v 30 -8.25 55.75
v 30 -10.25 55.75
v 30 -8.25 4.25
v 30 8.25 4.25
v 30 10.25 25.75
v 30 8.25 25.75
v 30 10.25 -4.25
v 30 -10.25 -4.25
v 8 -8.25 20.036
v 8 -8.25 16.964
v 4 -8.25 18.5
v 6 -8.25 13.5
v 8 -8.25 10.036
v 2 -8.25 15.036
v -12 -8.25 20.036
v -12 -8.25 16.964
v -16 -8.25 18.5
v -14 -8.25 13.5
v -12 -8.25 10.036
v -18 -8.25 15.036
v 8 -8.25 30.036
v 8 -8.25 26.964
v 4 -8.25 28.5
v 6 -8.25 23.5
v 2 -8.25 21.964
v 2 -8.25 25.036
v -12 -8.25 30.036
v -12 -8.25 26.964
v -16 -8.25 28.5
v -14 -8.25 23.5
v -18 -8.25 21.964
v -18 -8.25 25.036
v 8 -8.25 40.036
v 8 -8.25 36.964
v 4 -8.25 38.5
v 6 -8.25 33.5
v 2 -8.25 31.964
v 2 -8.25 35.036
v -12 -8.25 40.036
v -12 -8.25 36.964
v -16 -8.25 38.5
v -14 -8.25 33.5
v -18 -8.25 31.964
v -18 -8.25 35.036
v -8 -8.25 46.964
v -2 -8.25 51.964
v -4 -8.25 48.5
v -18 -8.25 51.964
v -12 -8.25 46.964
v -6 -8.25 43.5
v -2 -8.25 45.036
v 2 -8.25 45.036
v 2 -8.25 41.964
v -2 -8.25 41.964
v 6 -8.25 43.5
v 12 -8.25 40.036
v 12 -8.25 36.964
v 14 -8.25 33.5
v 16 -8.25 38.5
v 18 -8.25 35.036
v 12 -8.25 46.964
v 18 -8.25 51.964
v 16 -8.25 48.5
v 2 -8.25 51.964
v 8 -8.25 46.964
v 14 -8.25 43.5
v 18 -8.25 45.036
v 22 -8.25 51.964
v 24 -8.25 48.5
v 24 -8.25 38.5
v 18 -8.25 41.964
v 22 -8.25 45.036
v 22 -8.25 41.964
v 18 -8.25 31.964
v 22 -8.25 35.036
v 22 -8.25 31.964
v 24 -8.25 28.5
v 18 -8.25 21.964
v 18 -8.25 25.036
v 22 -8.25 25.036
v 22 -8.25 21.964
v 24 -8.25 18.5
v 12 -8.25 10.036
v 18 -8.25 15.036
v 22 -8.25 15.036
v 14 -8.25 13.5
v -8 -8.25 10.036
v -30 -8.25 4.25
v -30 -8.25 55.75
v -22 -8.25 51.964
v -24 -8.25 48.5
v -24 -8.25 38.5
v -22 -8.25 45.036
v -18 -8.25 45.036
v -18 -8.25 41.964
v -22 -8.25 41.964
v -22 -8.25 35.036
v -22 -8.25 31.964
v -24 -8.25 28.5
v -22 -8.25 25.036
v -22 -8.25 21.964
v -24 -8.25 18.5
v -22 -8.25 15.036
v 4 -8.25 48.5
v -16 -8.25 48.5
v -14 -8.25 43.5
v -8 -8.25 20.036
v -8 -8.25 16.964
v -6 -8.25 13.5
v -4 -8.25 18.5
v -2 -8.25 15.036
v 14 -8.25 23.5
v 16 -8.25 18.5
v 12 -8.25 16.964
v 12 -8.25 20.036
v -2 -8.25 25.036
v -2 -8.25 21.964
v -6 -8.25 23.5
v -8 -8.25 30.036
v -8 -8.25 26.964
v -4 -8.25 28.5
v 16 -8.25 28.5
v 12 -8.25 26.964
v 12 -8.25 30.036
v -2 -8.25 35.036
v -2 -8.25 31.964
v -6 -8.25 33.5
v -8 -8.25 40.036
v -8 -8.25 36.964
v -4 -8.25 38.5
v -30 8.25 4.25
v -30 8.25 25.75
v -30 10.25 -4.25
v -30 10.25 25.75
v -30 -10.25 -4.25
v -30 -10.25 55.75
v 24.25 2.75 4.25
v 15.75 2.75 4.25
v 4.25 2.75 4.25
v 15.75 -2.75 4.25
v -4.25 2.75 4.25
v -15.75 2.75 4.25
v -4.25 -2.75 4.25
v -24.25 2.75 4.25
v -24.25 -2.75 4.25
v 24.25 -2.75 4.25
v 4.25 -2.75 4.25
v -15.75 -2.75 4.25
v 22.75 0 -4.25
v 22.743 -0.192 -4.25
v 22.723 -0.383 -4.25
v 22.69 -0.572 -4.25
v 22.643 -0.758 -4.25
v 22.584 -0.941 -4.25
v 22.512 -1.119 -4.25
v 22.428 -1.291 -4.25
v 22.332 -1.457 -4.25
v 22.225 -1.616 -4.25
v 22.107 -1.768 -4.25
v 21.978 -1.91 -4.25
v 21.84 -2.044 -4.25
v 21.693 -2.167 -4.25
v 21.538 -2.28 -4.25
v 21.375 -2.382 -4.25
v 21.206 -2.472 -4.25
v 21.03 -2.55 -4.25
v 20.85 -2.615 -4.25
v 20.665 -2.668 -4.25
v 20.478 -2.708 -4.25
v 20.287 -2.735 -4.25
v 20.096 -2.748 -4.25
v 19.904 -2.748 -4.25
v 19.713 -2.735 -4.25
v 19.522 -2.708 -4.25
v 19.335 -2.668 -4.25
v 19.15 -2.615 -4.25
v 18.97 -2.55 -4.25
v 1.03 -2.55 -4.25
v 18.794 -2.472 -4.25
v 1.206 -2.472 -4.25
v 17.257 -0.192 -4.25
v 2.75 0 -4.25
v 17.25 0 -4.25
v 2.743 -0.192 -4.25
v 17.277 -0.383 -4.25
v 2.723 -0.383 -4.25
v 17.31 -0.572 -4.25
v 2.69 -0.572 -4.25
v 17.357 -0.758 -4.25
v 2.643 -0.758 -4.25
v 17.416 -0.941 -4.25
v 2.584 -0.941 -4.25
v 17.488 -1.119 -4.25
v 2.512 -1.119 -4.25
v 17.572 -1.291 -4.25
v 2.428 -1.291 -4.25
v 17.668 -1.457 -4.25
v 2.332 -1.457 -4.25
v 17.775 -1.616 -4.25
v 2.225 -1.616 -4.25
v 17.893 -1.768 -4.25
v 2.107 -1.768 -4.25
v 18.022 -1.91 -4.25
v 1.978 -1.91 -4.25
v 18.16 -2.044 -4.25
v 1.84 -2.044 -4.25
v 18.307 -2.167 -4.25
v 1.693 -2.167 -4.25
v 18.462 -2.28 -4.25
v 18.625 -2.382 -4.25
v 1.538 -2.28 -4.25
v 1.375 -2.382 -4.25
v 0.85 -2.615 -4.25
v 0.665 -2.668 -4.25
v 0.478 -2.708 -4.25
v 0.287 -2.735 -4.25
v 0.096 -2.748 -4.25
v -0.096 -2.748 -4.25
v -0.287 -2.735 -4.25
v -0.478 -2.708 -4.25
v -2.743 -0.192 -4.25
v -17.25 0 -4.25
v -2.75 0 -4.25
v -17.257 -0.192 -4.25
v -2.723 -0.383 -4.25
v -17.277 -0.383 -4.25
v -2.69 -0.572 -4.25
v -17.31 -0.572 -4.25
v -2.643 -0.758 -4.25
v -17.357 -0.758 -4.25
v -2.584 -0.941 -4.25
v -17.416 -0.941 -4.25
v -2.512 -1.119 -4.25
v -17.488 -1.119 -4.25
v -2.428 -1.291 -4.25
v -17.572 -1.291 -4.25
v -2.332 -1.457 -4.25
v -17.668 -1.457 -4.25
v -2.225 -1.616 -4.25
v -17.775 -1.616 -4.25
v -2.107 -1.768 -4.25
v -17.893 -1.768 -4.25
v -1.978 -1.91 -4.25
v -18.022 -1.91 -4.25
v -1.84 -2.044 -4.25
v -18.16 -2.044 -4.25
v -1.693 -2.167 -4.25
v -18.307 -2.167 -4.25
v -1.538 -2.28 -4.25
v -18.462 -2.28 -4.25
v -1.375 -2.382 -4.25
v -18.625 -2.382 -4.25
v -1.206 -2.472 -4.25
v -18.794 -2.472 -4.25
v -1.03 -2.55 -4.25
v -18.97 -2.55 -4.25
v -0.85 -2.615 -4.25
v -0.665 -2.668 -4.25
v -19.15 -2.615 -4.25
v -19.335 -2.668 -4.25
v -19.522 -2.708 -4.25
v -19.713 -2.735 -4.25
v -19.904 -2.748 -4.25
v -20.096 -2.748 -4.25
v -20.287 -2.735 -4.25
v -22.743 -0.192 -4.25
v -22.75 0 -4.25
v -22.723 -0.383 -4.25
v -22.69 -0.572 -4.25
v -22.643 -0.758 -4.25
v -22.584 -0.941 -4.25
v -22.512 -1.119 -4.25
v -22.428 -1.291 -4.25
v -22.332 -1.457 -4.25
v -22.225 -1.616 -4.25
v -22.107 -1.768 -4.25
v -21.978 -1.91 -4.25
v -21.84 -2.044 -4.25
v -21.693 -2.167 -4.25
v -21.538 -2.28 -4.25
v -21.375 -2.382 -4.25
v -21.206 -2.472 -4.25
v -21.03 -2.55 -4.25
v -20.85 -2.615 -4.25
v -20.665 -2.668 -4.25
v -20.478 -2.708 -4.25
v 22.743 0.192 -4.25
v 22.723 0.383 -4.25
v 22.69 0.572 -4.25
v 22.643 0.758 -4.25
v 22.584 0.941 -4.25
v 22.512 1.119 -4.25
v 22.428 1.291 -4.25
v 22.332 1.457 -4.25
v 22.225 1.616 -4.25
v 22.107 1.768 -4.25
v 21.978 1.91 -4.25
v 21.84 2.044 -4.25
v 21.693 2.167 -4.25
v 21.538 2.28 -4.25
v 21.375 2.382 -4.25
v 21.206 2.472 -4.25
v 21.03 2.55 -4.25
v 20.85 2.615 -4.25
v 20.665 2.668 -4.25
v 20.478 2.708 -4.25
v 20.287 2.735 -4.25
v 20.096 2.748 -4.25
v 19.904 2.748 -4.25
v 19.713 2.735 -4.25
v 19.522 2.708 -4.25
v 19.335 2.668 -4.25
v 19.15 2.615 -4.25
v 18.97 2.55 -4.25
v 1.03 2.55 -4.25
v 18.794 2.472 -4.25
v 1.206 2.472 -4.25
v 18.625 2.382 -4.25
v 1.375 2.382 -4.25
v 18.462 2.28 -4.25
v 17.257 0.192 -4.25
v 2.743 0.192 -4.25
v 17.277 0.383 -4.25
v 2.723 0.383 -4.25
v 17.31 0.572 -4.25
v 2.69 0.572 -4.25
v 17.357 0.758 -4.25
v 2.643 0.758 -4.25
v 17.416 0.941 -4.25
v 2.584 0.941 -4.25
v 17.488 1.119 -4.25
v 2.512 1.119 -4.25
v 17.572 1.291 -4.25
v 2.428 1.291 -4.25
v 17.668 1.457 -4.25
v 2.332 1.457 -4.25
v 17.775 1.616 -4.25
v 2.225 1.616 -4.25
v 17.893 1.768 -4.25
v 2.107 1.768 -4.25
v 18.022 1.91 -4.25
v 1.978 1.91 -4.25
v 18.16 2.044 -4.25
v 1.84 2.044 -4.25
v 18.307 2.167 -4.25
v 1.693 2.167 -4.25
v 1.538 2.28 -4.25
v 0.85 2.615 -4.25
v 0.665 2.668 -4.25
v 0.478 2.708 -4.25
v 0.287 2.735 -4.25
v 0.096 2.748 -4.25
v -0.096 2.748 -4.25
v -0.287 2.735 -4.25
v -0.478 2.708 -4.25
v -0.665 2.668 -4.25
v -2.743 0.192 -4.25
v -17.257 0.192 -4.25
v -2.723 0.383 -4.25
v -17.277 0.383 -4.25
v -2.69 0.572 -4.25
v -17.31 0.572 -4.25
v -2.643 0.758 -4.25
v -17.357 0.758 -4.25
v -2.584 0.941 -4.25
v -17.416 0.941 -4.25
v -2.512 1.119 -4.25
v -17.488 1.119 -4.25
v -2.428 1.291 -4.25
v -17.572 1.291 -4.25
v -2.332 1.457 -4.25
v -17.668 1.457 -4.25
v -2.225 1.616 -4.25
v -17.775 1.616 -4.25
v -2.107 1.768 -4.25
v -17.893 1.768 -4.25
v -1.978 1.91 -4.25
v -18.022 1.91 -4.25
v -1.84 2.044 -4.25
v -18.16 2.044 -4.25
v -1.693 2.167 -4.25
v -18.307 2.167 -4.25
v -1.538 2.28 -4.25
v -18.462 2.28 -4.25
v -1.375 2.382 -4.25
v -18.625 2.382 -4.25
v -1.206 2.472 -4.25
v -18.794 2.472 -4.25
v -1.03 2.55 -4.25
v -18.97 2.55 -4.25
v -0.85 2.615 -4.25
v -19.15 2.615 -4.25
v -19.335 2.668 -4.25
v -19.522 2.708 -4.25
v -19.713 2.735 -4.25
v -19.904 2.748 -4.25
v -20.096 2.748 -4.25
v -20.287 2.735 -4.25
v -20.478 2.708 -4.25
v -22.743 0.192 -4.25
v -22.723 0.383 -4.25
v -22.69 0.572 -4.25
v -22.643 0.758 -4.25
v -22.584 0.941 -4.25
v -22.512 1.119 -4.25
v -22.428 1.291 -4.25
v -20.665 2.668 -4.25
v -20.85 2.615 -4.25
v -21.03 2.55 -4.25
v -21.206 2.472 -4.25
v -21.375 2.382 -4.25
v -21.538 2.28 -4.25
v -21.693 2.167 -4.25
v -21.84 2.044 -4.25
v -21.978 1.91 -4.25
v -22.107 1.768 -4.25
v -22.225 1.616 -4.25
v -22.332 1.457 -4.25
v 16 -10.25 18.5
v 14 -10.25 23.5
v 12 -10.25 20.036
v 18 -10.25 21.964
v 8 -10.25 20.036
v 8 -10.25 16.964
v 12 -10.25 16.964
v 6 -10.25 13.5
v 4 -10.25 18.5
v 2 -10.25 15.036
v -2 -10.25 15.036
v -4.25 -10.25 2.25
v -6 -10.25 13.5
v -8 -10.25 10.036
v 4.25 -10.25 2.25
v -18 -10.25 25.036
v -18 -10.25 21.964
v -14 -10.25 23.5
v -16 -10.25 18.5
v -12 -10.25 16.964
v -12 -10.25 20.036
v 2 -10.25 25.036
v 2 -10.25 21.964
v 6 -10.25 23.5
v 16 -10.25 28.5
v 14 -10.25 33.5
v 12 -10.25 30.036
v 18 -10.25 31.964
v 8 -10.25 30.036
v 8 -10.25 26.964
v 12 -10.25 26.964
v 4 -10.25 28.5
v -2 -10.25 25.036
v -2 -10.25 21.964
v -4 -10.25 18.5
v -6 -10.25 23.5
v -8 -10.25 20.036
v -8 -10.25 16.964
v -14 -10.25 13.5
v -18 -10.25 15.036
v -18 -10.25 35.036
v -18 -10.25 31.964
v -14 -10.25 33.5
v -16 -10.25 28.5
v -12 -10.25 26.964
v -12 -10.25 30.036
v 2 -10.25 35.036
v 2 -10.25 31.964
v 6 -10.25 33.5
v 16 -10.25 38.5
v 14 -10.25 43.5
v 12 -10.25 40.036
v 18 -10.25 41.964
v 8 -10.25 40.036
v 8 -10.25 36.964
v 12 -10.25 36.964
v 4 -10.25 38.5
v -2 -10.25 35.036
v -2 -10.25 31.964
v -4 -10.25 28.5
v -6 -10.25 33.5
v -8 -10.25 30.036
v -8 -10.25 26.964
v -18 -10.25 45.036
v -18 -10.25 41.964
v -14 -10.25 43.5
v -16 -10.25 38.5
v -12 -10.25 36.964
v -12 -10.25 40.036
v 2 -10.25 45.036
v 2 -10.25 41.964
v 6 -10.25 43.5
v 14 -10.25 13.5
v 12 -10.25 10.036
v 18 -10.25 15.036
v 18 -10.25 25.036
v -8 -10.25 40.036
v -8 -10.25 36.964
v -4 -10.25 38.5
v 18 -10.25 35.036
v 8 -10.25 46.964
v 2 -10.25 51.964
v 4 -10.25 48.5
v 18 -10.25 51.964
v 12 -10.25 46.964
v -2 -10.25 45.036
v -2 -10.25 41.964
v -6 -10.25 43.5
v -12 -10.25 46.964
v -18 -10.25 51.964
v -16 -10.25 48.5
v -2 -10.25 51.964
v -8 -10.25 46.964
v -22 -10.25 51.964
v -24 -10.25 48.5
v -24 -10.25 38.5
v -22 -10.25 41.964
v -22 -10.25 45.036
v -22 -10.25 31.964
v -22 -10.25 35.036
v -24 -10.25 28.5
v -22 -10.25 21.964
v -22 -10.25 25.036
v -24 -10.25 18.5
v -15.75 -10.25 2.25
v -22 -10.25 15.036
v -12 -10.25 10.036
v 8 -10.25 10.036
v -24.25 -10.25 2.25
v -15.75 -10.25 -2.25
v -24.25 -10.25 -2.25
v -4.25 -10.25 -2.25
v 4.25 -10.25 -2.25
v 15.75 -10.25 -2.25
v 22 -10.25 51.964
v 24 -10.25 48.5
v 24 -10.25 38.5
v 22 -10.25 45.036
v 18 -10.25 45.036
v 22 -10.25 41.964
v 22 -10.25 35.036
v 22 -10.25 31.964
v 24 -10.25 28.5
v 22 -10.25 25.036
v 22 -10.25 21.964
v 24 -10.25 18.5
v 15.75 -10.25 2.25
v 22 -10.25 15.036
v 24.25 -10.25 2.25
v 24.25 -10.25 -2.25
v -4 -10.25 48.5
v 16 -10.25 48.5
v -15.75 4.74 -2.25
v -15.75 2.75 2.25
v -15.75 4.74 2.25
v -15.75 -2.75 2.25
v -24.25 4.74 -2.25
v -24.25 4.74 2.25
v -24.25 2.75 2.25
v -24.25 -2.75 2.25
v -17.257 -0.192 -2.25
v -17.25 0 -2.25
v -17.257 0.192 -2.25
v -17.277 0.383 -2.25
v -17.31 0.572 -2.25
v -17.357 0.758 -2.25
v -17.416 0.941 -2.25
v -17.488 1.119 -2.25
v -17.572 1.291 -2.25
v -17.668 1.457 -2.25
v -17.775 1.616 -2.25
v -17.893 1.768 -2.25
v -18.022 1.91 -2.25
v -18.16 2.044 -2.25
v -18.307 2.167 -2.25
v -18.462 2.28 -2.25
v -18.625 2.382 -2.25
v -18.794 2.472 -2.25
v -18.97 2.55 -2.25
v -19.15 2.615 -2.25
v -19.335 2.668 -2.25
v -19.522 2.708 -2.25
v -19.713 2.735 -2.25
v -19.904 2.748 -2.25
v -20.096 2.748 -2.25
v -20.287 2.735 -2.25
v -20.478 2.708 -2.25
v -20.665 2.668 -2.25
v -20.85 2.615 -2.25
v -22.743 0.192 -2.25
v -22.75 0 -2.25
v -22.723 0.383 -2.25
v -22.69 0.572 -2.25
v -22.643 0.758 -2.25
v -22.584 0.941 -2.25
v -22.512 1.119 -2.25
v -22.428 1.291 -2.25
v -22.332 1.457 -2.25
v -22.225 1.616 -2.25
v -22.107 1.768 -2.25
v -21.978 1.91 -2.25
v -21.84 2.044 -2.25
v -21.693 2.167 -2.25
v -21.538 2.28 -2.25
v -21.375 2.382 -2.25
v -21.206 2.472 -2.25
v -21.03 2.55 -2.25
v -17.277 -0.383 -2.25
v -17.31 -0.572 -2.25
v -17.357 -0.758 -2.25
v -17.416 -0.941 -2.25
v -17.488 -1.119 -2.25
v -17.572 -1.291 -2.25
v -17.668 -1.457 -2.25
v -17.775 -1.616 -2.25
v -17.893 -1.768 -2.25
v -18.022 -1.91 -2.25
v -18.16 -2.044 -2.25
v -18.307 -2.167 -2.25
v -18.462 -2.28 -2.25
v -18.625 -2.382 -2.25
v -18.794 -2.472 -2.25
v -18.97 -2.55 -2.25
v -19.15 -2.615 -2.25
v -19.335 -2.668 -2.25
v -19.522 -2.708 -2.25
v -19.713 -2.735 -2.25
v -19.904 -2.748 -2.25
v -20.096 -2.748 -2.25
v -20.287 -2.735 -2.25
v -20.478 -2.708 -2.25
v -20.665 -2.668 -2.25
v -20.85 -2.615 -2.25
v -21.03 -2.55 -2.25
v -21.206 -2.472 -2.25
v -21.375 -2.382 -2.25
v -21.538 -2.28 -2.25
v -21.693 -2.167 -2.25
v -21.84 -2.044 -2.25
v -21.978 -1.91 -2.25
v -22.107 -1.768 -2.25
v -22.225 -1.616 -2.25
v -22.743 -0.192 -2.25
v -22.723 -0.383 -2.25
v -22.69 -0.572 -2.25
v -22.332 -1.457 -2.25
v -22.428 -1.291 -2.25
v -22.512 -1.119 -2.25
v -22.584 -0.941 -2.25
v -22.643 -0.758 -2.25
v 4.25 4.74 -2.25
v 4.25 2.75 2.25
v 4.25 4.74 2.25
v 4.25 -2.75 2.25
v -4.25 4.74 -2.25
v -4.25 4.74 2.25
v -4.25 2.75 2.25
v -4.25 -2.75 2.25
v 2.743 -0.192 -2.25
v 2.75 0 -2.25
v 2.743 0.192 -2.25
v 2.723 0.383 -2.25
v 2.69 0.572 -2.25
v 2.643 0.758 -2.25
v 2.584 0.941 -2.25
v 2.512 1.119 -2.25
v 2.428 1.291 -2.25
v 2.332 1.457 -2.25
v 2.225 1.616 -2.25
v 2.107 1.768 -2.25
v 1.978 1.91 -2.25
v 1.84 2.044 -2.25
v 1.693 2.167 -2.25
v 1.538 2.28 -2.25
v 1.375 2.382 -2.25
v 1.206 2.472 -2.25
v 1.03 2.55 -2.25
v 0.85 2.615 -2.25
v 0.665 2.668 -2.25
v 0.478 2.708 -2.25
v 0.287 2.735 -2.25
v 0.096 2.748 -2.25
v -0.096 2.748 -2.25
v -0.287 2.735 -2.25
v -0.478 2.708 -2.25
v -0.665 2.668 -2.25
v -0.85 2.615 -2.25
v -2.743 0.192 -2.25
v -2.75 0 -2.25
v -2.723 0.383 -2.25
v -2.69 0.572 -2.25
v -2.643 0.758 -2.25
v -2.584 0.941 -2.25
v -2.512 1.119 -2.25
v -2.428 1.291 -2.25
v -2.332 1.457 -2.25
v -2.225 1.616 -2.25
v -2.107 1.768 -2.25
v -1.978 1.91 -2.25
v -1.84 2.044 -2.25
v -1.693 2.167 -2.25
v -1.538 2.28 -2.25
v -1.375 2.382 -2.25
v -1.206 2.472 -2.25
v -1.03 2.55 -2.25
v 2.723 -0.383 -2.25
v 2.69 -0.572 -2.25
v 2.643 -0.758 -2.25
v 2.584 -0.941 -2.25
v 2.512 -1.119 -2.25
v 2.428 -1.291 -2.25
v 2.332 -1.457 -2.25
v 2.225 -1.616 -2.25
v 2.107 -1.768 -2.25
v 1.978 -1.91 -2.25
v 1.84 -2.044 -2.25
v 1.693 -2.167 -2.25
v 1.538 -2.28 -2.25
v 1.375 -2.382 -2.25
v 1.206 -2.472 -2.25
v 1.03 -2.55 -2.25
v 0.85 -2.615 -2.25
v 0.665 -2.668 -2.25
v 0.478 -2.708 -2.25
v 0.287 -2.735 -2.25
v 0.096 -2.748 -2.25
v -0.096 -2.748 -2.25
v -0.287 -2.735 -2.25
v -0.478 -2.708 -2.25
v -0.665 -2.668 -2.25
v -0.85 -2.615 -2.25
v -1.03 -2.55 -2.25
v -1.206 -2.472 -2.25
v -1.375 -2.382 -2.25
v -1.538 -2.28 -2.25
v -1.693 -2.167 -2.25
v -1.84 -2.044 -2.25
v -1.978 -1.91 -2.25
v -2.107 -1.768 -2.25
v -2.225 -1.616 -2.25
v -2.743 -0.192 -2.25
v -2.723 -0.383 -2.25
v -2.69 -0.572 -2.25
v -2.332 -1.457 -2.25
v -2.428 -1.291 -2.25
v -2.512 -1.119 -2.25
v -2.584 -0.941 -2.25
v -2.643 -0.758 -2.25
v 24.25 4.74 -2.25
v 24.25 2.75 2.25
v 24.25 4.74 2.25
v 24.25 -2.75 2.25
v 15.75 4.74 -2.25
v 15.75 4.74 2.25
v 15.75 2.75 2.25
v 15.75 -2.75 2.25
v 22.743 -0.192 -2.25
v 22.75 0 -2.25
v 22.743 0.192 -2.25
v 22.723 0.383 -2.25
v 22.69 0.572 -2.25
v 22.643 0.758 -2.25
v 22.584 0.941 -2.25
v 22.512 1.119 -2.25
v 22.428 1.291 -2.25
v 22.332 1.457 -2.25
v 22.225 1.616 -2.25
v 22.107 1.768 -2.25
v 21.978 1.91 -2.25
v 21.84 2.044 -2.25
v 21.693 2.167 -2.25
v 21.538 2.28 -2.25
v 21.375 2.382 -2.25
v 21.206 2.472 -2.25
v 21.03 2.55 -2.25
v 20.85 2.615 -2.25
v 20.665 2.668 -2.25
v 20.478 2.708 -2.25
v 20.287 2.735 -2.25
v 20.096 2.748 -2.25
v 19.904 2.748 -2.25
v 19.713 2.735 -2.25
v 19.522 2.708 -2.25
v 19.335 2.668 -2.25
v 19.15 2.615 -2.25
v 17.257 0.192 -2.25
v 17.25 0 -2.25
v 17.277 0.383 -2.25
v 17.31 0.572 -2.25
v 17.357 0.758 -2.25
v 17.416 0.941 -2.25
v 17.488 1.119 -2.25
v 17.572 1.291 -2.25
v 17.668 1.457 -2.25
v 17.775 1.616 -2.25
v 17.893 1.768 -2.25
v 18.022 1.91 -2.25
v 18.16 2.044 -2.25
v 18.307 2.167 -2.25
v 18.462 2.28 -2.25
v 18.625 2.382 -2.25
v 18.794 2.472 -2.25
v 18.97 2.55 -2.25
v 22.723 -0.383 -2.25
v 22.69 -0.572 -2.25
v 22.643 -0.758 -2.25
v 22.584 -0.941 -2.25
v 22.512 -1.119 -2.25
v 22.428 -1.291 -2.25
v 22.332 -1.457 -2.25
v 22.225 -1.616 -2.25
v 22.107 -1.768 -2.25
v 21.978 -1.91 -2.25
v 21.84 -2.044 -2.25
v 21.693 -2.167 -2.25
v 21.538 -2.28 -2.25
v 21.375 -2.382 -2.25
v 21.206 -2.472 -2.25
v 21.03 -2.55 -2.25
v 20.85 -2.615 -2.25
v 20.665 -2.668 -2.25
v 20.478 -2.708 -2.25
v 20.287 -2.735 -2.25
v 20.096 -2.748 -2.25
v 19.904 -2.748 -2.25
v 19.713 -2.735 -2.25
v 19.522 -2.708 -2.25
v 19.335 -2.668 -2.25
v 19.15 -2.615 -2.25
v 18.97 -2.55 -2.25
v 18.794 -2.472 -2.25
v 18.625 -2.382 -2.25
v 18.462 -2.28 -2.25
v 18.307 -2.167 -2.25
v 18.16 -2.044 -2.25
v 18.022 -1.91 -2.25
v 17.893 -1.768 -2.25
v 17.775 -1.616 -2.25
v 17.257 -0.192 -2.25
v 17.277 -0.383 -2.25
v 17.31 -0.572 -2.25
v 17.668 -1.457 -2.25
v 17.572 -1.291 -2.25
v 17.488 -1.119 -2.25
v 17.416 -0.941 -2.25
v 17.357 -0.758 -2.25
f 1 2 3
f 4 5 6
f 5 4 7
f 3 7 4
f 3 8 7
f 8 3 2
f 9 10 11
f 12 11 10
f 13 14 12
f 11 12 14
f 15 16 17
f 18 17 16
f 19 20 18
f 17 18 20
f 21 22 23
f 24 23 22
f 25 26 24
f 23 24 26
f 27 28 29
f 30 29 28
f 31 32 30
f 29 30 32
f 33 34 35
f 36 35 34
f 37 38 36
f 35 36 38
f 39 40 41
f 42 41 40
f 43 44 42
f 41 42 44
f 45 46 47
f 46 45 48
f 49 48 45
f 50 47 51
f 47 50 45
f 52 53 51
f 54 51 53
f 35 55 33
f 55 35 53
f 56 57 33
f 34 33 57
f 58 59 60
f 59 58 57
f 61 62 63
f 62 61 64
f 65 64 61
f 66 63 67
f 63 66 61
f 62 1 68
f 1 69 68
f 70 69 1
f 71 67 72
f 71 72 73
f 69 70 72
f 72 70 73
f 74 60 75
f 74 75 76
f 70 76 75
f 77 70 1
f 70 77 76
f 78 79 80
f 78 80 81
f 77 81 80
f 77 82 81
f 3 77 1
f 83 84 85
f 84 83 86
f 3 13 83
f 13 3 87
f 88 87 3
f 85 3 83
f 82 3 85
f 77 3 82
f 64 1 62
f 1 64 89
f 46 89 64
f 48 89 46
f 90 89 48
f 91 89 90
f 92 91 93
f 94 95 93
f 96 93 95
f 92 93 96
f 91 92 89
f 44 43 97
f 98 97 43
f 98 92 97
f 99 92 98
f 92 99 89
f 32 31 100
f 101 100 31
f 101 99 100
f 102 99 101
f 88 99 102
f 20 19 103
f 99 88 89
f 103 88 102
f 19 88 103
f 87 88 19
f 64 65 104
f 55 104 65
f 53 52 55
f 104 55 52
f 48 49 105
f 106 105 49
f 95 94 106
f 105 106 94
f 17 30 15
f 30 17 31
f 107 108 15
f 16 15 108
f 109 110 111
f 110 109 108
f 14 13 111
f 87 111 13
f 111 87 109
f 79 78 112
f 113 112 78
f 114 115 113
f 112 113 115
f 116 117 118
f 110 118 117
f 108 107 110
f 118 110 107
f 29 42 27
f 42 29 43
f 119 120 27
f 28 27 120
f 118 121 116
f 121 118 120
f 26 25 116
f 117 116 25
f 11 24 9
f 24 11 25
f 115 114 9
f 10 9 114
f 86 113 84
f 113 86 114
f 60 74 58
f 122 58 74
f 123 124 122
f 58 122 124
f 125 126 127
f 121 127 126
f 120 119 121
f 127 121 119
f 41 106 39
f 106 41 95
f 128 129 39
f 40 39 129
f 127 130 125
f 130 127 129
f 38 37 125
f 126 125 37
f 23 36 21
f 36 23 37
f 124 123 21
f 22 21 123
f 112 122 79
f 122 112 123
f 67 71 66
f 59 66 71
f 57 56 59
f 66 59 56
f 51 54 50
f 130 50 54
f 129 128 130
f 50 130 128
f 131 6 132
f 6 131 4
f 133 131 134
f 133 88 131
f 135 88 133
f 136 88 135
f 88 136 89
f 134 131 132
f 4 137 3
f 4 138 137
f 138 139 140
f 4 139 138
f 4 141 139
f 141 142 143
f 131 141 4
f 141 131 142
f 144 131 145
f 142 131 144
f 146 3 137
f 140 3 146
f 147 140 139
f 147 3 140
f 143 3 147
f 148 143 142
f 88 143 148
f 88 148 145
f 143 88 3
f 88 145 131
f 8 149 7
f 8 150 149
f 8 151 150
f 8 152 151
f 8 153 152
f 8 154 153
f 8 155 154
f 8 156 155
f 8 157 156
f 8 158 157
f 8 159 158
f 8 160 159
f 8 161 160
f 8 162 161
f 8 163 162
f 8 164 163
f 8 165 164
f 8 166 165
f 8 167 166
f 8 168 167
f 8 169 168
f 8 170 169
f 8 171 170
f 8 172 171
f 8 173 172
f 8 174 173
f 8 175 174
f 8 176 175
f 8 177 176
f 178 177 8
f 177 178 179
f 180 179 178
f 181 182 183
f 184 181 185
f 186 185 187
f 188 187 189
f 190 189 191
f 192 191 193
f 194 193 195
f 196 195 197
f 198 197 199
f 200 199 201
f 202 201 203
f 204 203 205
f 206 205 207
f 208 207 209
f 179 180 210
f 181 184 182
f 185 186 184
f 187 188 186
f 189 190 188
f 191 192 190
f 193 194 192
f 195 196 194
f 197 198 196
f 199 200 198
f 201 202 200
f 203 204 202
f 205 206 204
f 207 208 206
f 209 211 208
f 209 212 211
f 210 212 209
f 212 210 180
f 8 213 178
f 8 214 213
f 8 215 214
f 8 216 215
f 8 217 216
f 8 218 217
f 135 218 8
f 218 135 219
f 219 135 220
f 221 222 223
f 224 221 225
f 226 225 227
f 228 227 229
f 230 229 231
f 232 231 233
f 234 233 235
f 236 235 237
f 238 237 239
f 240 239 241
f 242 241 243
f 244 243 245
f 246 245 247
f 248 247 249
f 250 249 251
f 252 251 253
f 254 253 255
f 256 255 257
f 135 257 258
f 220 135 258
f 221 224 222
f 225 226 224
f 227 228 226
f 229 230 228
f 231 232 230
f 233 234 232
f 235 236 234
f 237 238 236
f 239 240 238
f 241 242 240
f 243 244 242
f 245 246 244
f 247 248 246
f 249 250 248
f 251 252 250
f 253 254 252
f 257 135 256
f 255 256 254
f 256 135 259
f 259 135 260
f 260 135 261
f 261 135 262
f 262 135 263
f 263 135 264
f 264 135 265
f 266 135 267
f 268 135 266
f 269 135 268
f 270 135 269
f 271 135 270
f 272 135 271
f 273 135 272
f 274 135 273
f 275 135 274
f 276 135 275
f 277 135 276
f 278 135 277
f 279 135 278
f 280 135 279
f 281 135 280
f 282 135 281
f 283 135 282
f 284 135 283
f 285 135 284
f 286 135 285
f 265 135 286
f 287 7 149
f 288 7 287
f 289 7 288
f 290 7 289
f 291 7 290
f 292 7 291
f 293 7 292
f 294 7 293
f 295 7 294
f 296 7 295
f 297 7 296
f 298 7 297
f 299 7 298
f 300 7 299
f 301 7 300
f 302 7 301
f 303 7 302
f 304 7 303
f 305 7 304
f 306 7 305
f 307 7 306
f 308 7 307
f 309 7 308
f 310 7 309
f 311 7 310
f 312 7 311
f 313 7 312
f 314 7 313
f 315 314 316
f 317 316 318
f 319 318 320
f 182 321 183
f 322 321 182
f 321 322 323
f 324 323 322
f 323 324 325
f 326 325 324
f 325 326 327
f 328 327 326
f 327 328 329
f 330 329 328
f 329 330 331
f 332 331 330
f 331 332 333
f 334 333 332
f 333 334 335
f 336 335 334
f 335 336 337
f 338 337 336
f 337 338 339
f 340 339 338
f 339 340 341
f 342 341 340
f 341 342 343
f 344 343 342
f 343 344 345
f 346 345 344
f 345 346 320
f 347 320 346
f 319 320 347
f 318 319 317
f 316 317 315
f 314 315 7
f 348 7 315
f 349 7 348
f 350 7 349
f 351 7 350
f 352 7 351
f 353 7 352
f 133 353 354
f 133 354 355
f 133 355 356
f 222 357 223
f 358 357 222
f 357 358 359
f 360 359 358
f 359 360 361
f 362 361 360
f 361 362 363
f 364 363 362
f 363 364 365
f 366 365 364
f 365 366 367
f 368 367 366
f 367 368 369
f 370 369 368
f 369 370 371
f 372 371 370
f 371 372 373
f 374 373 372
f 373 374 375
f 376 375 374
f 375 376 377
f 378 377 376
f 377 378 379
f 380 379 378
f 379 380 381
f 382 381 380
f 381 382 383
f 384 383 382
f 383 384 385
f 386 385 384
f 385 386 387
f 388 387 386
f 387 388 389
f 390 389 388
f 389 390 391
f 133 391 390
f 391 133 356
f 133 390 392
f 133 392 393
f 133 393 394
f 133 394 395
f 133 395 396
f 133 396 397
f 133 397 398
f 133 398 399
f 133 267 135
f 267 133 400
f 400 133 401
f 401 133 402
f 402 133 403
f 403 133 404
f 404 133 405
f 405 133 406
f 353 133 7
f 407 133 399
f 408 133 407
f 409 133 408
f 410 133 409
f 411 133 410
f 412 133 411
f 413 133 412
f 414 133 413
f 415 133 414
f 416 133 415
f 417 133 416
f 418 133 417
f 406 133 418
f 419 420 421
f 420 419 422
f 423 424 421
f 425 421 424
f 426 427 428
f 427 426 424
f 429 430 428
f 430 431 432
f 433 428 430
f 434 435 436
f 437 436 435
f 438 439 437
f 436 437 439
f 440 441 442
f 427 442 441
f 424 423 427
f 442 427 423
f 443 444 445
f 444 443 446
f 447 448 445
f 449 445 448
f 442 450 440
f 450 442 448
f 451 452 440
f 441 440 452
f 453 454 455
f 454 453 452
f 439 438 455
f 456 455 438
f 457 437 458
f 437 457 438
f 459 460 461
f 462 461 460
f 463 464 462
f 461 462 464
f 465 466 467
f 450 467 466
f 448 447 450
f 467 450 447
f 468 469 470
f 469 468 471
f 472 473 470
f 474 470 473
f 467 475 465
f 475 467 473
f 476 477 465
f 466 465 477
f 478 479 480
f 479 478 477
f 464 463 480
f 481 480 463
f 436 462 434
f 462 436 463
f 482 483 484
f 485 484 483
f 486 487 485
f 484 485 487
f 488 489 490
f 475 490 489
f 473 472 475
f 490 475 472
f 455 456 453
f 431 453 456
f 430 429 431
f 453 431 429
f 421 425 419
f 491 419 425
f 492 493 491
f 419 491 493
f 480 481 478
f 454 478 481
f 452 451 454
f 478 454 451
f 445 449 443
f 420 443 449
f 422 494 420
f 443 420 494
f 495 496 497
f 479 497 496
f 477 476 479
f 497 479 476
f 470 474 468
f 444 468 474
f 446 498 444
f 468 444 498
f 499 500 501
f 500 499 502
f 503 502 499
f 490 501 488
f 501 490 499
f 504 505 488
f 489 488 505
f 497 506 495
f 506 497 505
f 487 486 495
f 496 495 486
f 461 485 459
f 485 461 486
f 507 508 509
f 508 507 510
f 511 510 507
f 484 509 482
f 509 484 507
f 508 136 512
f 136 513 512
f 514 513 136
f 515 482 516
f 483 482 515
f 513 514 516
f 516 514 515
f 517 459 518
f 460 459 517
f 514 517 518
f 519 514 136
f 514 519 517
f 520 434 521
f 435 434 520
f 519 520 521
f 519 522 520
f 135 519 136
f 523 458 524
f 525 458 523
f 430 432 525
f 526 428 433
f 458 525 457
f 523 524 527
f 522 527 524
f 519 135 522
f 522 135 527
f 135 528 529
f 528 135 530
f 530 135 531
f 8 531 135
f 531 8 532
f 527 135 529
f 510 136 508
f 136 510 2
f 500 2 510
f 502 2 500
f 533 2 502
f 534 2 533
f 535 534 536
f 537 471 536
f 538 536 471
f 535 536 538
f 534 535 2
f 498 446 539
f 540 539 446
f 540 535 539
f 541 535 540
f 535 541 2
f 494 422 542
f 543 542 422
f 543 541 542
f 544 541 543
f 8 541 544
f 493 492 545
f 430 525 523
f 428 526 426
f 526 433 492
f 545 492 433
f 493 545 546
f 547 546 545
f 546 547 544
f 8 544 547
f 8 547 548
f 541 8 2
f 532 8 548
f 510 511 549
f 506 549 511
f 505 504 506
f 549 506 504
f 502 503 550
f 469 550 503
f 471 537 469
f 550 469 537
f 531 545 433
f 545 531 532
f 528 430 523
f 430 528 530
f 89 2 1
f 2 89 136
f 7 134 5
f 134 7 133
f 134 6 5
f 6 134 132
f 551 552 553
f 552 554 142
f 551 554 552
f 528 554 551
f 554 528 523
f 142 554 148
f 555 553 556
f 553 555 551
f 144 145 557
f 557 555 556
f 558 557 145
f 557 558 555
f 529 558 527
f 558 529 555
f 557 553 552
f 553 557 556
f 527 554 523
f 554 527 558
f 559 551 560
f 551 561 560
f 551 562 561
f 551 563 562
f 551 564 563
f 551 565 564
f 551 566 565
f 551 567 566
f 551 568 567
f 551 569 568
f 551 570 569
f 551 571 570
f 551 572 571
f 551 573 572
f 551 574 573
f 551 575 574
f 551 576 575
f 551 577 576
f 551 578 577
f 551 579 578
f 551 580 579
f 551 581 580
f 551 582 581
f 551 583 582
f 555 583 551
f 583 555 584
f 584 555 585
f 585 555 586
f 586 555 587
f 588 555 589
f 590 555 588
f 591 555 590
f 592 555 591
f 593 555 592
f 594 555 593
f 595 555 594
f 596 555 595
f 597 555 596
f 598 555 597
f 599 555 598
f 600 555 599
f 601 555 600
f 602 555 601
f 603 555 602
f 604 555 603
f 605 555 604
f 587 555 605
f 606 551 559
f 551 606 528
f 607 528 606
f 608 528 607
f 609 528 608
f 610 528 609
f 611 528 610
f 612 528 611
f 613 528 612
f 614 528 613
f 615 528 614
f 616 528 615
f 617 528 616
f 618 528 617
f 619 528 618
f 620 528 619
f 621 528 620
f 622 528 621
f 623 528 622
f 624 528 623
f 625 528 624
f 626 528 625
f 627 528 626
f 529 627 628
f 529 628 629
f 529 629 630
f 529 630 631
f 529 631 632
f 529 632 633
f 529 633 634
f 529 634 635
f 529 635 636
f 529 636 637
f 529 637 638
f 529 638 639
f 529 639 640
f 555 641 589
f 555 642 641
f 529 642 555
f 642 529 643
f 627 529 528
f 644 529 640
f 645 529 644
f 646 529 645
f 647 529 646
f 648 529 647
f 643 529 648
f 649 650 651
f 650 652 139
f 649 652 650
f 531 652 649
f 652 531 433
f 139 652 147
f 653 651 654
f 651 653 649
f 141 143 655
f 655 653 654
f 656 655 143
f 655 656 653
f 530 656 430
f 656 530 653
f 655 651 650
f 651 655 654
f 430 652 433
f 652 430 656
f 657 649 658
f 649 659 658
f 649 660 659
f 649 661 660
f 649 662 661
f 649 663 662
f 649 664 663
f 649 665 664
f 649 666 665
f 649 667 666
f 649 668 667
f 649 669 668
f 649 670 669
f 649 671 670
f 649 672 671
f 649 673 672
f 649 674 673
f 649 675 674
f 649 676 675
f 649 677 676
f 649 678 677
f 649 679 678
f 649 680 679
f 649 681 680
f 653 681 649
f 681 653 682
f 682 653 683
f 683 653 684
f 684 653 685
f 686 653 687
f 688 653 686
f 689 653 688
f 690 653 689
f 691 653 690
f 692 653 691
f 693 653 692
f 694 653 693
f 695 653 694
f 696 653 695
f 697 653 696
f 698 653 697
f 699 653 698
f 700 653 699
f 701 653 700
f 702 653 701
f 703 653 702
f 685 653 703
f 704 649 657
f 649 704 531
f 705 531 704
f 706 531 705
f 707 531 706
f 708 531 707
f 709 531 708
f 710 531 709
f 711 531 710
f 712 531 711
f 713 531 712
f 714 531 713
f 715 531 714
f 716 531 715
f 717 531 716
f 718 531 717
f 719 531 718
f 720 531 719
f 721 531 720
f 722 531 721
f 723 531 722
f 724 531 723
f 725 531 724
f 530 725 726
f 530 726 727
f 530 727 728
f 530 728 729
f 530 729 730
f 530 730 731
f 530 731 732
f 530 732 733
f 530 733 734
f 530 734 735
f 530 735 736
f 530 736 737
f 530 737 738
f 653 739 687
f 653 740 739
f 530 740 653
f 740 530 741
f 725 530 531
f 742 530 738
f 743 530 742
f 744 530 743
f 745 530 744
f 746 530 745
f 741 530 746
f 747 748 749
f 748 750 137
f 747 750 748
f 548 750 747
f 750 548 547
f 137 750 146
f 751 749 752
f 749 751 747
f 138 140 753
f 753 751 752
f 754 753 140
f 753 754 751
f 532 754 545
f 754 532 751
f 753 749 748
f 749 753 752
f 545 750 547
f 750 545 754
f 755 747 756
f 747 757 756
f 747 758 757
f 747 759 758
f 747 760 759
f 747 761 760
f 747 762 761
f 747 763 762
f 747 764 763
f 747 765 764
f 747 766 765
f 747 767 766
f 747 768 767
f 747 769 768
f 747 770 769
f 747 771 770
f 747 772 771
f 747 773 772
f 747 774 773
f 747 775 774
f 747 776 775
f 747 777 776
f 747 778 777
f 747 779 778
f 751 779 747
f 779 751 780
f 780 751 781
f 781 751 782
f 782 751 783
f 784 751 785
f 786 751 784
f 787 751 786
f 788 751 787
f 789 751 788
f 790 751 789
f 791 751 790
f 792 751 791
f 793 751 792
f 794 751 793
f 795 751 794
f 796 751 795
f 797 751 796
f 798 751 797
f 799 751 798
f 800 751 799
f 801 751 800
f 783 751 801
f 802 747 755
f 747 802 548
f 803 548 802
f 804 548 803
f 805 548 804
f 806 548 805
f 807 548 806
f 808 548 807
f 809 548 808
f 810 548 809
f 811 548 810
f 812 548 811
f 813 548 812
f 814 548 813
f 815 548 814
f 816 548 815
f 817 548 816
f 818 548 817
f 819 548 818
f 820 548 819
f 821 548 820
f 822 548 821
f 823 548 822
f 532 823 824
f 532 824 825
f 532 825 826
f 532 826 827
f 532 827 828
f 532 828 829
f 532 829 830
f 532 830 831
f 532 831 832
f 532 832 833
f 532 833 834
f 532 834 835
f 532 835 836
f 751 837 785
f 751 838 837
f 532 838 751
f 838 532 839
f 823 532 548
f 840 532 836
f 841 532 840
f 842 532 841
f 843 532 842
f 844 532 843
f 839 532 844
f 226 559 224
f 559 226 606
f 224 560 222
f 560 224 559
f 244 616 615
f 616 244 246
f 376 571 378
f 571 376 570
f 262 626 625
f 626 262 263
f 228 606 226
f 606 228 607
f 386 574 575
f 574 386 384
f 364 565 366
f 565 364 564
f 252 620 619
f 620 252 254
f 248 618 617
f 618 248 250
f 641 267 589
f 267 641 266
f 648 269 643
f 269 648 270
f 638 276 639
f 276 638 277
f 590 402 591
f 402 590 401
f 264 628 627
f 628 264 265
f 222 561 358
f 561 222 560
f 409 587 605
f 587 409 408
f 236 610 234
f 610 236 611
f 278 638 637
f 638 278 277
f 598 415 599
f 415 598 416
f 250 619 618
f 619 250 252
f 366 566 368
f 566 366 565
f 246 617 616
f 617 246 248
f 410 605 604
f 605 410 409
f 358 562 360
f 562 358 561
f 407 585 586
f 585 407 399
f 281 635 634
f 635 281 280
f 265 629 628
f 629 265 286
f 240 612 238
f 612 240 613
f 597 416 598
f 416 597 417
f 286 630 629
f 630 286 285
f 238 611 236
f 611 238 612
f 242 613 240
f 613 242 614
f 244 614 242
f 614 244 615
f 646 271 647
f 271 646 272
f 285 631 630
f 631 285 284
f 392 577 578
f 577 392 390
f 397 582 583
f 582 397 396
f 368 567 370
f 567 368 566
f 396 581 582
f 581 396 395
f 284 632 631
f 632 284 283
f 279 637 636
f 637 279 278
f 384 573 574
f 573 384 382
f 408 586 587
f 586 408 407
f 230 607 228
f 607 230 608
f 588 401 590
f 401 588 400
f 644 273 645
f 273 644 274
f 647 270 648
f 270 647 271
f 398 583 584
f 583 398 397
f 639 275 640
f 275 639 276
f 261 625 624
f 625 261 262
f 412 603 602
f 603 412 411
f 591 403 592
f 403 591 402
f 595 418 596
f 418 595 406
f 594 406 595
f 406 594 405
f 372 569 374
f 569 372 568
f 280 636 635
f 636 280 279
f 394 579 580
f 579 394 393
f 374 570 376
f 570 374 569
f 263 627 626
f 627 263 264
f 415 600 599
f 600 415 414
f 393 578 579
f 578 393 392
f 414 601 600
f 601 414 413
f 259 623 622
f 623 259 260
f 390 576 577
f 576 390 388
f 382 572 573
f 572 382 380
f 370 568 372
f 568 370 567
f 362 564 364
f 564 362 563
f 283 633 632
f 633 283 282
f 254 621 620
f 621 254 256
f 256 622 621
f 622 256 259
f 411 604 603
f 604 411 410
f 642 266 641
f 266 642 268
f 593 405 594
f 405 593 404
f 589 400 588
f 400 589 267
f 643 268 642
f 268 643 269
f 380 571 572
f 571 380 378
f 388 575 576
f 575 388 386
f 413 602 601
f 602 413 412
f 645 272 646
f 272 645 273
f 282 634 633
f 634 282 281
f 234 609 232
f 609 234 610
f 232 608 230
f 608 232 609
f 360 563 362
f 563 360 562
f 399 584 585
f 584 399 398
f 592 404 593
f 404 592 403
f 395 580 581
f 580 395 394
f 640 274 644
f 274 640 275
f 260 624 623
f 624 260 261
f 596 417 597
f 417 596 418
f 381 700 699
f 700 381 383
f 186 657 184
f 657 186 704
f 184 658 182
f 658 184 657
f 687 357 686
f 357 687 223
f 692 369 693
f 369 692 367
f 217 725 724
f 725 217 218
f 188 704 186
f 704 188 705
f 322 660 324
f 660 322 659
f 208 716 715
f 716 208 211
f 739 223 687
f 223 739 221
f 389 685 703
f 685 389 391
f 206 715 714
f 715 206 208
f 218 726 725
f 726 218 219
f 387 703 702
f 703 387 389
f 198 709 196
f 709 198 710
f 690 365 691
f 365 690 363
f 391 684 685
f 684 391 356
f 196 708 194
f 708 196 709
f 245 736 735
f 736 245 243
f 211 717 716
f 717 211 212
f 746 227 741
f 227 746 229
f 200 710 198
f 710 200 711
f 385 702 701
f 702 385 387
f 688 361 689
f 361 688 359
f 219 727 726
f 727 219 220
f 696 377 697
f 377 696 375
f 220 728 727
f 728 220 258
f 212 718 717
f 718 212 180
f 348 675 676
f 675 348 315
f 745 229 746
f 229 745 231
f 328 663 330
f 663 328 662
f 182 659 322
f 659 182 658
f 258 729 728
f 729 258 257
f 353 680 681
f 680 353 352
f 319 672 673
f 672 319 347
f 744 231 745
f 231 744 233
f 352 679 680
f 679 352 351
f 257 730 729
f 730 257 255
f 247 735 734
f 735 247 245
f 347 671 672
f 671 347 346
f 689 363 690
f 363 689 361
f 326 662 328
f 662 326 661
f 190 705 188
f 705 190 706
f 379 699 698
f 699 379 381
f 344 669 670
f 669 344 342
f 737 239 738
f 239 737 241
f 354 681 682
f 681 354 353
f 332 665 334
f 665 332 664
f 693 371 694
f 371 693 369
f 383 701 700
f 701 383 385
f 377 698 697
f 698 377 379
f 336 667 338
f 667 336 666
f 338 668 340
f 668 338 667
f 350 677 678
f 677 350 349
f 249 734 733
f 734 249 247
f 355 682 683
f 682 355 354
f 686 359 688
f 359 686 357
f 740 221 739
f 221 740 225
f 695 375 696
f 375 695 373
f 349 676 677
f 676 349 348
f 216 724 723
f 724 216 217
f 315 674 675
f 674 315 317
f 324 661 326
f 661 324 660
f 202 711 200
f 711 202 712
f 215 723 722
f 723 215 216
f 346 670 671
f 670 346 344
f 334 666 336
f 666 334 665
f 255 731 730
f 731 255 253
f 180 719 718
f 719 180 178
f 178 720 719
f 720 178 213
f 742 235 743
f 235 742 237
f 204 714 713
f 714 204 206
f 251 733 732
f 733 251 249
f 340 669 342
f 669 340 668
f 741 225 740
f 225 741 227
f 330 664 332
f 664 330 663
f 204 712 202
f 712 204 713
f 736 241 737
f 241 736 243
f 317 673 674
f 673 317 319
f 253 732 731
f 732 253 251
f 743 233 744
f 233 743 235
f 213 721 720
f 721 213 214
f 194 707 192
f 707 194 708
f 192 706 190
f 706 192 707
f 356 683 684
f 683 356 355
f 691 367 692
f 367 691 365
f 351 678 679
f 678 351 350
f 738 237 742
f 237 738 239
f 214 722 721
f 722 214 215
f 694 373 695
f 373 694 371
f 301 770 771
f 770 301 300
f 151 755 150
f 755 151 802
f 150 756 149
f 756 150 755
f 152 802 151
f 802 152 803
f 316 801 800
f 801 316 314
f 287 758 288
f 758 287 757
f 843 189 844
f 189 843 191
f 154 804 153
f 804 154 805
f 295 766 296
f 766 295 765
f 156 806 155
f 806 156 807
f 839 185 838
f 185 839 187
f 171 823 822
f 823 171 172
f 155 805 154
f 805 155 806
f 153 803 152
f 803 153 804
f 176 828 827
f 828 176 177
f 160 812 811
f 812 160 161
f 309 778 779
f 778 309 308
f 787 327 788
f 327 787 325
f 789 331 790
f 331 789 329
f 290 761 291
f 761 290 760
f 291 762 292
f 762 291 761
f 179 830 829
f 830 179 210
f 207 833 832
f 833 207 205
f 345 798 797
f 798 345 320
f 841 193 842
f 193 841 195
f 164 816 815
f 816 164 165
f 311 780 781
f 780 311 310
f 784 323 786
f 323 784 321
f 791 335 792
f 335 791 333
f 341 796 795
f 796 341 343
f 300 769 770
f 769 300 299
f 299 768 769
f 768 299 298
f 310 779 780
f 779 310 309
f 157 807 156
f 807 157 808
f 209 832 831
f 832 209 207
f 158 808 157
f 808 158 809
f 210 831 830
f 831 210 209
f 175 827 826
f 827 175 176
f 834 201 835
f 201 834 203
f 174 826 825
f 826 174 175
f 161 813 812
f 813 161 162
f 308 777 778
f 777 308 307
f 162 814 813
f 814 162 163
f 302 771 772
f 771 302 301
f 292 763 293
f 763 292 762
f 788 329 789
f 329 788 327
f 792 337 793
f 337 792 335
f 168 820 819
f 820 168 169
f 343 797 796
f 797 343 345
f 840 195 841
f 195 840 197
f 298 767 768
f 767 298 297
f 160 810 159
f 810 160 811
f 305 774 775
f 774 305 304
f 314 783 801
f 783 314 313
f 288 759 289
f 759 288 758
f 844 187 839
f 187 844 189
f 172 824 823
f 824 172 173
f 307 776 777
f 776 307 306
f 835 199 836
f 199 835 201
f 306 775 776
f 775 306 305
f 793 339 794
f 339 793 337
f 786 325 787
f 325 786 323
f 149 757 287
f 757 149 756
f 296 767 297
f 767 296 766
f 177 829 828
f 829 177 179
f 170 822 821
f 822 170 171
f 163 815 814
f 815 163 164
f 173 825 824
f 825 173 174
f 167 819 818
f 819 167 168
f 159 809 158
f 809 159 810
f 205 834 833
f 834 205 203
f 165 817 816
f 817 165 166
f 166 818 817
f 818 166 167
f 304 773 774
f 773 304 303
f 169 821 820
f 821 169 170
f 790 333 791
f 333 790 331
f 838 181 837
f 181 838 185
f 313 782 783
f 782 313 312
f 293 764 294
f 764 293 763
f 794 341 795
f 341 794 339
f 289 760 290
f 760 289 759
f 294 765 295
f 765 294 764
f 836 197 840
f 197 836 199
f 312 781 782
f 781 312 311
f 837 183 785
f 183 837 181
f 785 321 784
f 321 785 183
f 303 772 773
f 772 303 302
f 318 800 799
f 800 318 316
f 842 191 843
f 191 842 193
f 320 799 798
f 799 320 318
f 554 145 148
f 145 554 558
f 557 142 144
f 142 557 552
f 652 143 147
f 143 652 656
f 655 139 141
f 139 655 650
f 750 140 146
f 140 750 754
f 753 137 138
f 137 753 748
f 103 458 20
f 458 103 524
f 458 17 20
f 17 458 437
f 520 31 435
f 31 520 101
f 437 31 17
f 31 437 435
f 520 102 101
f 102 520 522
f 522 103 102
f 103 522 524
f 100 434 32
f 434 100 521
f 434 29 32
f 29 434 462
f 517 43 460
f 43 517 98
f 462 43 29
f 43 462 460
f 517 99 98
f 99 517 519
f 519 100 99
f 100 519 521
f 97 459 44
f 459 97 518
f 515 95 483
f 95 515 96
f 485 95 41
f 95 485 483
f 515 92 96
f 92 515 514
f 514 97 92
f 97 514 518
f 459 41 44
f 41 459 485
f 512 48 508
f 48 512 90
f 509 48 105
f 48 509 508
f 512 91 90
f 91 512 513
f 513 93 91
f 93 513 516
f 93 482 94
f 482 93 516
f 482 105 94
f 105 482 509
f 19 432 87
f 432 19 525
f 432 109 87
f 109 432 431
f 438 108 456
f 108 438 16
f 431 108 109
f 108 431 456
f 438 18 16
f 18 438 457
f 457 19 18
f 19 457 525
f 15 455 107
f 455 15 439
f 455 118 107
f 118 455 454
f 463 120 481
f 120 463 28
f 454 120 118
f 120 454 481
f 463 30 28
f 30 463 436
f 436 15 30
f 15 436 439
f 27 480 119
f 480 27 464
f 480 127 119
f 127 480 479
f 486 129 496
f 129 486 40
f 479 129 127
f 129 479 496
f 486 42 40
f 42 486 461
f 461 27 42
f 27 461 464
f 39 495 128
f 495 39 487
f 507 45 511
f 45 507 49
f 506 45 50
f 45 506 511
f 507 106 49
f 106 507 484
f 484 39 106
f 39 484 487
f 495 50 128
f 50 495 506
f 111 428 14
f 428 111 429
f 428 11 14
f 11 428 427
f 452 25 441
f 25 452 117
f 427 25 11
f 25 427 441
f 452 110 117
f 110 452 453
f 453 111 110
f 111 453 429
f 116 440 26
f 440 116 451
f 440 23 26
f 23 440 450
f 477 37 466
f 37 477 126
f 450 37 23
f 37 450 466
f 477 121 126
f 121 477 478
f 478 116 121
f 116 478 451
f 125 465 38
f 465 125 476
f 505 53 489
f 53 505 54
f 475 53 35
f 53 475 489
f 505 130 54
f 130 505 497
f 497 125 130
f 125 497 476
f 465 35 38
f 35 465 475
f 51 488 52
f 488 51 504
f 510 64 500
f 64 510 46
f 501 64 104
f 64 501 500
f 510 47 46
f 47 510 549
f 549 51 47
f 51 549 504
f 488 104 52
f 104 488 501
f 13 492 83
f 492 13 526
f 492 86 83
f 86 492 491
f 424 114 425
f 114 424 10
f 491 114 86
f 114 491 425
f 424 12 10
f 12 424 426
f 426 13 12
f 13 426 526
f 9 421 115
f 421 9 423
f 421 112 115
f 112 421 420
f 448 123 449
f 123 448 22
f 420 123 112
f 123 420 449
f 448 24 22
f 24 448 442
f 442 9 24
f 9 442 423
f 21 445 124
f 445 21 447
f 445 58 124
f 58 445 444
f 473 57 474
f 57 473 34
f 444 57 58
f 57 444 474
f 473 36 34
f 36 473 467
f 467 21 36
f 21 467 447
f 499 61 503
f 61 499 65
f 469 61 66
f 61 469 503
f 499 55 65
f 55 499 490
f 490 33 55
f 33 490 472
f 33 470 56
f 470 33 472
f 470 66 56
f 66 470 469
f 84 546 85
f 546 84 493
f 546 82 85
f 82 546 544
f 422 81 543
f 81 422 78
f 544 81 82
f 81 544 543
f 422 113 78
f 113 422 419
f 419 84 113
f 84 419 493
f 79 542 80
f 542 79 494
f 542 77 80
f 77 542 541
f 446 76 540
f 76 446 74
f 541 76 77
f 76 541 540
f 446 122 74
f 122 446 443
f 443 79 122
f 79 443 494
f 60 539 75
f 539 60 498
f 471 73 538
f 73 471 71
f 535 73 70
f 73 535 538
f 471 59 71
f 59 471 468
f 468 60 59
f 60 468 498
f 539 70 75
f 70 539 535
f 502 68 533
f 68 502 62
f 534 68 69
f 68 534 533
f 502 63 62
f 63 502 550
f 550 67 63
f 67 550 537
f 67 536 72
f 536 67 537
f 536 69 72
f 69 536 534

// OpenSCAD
// How thick is the shelf?
Shelf_Thickness = 16.5;

// Overhang above shelf?
Upper_Overhang = 60;

// Overhang below shelf
Lower_Overhang = 30;

// Slight tilt so we fit on firmly
Overhang_Angle = 15;

// Total width we will generate, >= to Nut_Spacing!
Width = 60;

// General thickness of OUR part
Thickness = 2;

// How far apart to space the nuts
Nut_Spacing = 20;

M5_Square_Nut_Size = 8.5;  // measured 8.0
M5_Square_Nut_Thickness = 4.5; // measured 3.8
M5_Clearance_Hole = 5.5;

M4_Square_Nut_Size = 7;
M4_Square_Nut_Thickness = 3.1;
M4_Clearance_Hole = 4.5;

M3_Square_Nut_Size = 5.5;
M3_Square_Nut_Thickness = 2.5;
M3_Clearance_Hole = 3.4;

//
//  Adjust based on your preferred nut size
//
Square_Nut_Size = M5_Square_Nut_Size;
Square_Nut_Thickness = M5_Square_Nut_Thickness;
Clearance_Hole = M5_Clearance_Hole;

Square_Nut_Extra_Depth = 0.5;
Front_Thickness = (2*Thickness) + Square_Nut_Thickness;


module Thingy() {
    
    // Compute start and end nut positions.
    // Evenly distribute extra space at each end.
    usableWidth = floor(Width/Nut_Spacing) * Nut_Spacing;
    echo("usableWidth", usableWidth);
    leftover = (Width - usableWidth) > 0 ? Width - usableWidth : Nut_Spacing;
    echo("Leftover", leftover);
    start = -((Width/2) + (leftover/2));
    echo("Start", start);
    end = (Width/2);
    echo("End", end);
    
    //
    //  The big square U shape that fits over the shelf.
    //
    module SolidPart() {
        // Front Part
        cube([Width,Front_Thickness,Shelf_Thickness], center=true);
        zq = (Shelf_Thickness/2)+(Thickness/2);
        yq_u = (Upper_Overhang/2) - (Front_Thickness/2);
        yq_l = (Lower_Overhang/2) - (Front_Thickness/2);
        
        // Top Part
        translate([0,yq_u,zq]) cube([Width,Upper_Overhang,Thickness], center=true);
        
        // Bottom Part
        translate([0,yq_l,-zq]) cube([Width,Lower_Overhang,Thickness], center=true);
    }
    
//    module CutoutSupports() {
//        adj = 0;
//        // TODO: Put a little top on these
//        // To make them easy to poke out.
//        SupportThickness = Square_Nut_Thickness + Thickness + adj;
//        nw = (Width/2)-(Nut_Spacing/2);
//        for (x = [start: Nut_Spacing: end]) {
//            rotate([90,0,0]) 
//                translate([x,0,Thickness/2]) 
//                    cylinder(
//                        d2=Clearance_Hole/2, 
//                        d1= Clearance_Hole,
//                        h = SupportThickness,center=true, $fn=45);
//        }
//    }
    
    module CutoutsForNuts() {
        nw = (Width/2)-(Nut_Spacing/2);
        // FIXME: Evenly space when width isn't properly divisible.
        // FIXME: Eliminate the double overhang thing
        
        h = Shelf_Thickness + (2*Thickness);
        nutHoleHeight = 
              (Square_Nut_Size/2)
            + (Shelf_Thickness/2)
            + Thickness
            + Square_Nut_Extra_Depth
            - 0.0;
        nutHoleTranslateZ = (nutHoleHeight/2)
            - (Square_Nut_Size/2)
            - Square_Nut_Extra_Depth
            + 0.01;
        for (x = [start: Nut_Spacing: end]) {
            translate([x,0,nutHoleTranslateZ])
                cube([Square_Nut_Size,Square_Nut_Thickness, nutHoleHeight], center=true);
        }
        //for (x = [start:Nut_Spacing:end]) {
        //    translate([x,Front_Thickness/2-(Thickness/2,0]) {
        //        %cube([Square_Nut_Size,2,Shelf_Thickness-0.01], center=true);
        //    }
        //}
    }
    
    module CutoutsForBolts() {
        nw = (Width/2)-(Nut_Spacing/2);
        for (x = [start: Nut_Spacing: end]) {
            rotate([90,0,0]) 
                translate([x,0,0]) 
                    cylinder(d=Clearance_Hole, h = 100,center=true, $fn=90);
        }
        for (x=[start:Nut_Spacing:end]) {
            translate([x,Front_Thickness/2-Thickness/2,0]) 
                cube([Square_Nut_Size,Thickness+0.1,Clearance_Hole],center=true);
        }
    }

//    module SquareCutoutsForBolts() {
//        nw = (Width/2)-(Nut_Spacing/2);
//        q = (Thickness/2) + (Square_Nut_Thickness/2) + 0.01;
//        for (x = [start: Nut_Spacing: end]) {
//            //rotate([90,0,0]) 
//                translate([x,q,0]) 
//                    // cylinder(d=Clearance_Hole, h = 100,center=true, $fn=45);
//            cube([Clearance_Hole, Thickness+0.03, Shelf_Thickness],center=true);
//        }
//    }
    
    module CutoutsForTop1() {
        // Might do this later.
        diam = 8;
        spacing = 10;
        yq_u = (Upper_Overhang/2) + (Front_Thickness/2);
        for (y=[-Upper_Overhang/2+spacing/2:spacing:Upper_Overhang/2-spacing/2-Front_Thickness]) {
            for (x=[-(Width/2)+spacing/2:spacing:Width/2-spacing/2]) {
                translate([x,y+yq_u,0])
                cylinder(d=diam,  h=100, center=true, $fn=6);
            }
        }
    }
    
    module HexCutouts(xsize, ysize, hexSize, hexSpacing, h) {
        hextot = hexSize + hexSpacing;
        xstart = -(xsize/2)+hextot/2;
        ystart = -(ysize/2)+hextot/2;
        xcount = floor((xsize-hextot/2)/hextot);
        ycount = floor((ysize-hextot/2)/hextot);
        
        //cylinder(d=1, h=200, center=true, $fn=90);
        for (x=[0:xcount-1]) {
            for (y=[0:ycount-1]) {
                translate(
                    [xstart + (x * hextot) + hextot/2 ,
                    ystart + (y * hextot) + (x%2==0?hextot/2:0),
                    0])
                    cylinder(d=hexSize, h=h, center=true, $fn=6);
            }
        }
    }
    
    module CutoutsForTop2() {
        xsize = Width;
        ysize = Upper_Overhang - Front_Thickness;
        hexSize = 8;
        hexSpacing = 2;
        
        // Automatically disable when testing w/small overhangs.
        if (Upper_Overhang > 2 * (hexSize + hexSpacing)) {
            translate([0,(Upper_Overhang/2) + (Front_Thickness/2),
                Shelf_Thickness/2 + Thickness/2])
                HexCutouts(xsize, ysize, hexSize, hexSpacing, h=Thickness+0.1);
        }
    }
    
    union() {
        difference() {
            SolidPart();
            CutoutsForNuts();
            CutoutsForBolts();
            //SquareCutoutsForBolts();
            CutoutsForTop2();
        }
        // CutoutSupports();
    }
    
}

// Rotate for cura. Un-rotate when working on the code!
rotate([90,0,0]) 
    Thingy();
